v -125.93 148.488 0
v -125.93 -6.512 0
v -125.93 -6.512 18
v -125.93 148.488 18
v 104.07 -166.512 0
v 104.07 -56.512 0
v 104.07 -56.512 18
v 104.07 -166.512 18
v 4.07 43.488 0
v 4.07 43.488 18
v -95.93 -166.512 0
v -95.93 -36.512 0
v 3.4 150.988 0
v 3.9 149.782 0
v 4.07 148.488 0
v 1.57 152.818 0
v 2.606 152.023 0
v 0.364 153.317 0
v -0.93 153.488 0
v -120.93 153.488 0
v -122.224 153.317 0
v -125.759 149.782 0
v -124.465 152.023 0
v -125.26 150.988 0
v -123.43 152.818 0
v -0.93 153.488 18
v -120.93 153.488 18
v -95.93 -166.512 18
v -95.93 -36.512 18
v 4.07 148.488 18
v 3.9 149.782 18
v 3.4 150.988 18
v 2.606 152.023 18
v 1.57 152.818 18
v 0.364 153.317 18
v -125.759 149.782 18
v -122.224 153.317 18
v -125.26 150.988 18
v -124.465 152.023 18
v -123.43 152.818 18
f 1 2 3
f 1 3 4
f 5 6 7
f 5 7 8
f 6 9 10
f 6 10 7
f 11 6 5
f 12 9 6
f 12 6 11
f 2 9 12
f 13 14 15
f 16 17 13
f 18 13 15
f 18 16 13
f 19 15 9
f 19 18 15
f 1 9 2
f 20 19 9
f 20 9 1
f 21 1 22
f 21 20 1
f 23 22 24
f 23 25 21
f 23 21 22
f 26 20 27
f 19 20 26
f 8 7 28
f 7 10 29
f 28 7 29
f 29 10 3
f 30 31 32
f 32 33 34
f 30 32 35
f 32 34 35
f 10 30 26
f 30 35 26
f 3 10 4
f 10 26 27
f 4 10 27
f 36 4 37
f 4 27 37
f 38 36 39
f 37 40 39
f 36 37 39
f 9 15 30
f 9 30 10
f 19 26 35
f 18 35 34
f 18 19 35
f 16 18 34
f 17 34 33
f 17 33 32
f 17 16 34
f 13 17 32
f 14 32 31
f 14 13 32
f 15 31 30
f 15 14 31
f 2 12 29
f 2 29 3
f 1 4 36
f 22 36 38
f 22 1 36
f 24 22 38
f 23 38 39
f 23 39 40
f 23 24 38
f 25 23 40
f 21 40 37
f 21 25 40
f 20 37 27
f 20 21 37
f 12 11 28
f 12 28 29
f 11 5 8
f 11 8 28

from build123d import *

# Parameters (mm, degrees)
BOSS_EXTRUDE1_DEPTH = 18


with BuildPart() as part:
    # Sketch1 → Boss-Extrude1 (new body)
    with BuildSketch(Plane.XY):
        with BuildLine():
            Line((4.070181983, 148.487708827), (4.070181983, 43.487708827))
            Line((4.070181983, 43.487708827), (104.070181983, -56.512291173))
            Line((104.070181983, -56.512291173), (104.070181983, -166.512291173))
            Line((104.070181983, -166.512291173), (-95.929818017, -166.512291173))
            Line((-95.929818017, -166.512291173), (-95.929818017, -36.512291173))
            Line((-95.929818017, -36.512291173), (-125.929818017, -6.512291173))
            Line((-125.929818017, -6.512291173), (-125.929818017, 148.487708827))
            ThreePointArc((-125.929818017, 148.487708827), (-124.465351923, 152.023242733), (-120.929818017, 153.487708827))
            Line((-120.929818017, 153.487708827), (-95.929818017, 153.487708827))
            Line((-95.929818017, 153.487708827), (-0.929818017, 153.487708827))
            ThreePointArc((-0.929818017, 153.487708827), (2.605715889, 152.023242733), (4.070181983, 148.487708827))
        make_face()
    extrude(amount=BOSS_EXTRUDE1_DEPTH)


solid = part.part
